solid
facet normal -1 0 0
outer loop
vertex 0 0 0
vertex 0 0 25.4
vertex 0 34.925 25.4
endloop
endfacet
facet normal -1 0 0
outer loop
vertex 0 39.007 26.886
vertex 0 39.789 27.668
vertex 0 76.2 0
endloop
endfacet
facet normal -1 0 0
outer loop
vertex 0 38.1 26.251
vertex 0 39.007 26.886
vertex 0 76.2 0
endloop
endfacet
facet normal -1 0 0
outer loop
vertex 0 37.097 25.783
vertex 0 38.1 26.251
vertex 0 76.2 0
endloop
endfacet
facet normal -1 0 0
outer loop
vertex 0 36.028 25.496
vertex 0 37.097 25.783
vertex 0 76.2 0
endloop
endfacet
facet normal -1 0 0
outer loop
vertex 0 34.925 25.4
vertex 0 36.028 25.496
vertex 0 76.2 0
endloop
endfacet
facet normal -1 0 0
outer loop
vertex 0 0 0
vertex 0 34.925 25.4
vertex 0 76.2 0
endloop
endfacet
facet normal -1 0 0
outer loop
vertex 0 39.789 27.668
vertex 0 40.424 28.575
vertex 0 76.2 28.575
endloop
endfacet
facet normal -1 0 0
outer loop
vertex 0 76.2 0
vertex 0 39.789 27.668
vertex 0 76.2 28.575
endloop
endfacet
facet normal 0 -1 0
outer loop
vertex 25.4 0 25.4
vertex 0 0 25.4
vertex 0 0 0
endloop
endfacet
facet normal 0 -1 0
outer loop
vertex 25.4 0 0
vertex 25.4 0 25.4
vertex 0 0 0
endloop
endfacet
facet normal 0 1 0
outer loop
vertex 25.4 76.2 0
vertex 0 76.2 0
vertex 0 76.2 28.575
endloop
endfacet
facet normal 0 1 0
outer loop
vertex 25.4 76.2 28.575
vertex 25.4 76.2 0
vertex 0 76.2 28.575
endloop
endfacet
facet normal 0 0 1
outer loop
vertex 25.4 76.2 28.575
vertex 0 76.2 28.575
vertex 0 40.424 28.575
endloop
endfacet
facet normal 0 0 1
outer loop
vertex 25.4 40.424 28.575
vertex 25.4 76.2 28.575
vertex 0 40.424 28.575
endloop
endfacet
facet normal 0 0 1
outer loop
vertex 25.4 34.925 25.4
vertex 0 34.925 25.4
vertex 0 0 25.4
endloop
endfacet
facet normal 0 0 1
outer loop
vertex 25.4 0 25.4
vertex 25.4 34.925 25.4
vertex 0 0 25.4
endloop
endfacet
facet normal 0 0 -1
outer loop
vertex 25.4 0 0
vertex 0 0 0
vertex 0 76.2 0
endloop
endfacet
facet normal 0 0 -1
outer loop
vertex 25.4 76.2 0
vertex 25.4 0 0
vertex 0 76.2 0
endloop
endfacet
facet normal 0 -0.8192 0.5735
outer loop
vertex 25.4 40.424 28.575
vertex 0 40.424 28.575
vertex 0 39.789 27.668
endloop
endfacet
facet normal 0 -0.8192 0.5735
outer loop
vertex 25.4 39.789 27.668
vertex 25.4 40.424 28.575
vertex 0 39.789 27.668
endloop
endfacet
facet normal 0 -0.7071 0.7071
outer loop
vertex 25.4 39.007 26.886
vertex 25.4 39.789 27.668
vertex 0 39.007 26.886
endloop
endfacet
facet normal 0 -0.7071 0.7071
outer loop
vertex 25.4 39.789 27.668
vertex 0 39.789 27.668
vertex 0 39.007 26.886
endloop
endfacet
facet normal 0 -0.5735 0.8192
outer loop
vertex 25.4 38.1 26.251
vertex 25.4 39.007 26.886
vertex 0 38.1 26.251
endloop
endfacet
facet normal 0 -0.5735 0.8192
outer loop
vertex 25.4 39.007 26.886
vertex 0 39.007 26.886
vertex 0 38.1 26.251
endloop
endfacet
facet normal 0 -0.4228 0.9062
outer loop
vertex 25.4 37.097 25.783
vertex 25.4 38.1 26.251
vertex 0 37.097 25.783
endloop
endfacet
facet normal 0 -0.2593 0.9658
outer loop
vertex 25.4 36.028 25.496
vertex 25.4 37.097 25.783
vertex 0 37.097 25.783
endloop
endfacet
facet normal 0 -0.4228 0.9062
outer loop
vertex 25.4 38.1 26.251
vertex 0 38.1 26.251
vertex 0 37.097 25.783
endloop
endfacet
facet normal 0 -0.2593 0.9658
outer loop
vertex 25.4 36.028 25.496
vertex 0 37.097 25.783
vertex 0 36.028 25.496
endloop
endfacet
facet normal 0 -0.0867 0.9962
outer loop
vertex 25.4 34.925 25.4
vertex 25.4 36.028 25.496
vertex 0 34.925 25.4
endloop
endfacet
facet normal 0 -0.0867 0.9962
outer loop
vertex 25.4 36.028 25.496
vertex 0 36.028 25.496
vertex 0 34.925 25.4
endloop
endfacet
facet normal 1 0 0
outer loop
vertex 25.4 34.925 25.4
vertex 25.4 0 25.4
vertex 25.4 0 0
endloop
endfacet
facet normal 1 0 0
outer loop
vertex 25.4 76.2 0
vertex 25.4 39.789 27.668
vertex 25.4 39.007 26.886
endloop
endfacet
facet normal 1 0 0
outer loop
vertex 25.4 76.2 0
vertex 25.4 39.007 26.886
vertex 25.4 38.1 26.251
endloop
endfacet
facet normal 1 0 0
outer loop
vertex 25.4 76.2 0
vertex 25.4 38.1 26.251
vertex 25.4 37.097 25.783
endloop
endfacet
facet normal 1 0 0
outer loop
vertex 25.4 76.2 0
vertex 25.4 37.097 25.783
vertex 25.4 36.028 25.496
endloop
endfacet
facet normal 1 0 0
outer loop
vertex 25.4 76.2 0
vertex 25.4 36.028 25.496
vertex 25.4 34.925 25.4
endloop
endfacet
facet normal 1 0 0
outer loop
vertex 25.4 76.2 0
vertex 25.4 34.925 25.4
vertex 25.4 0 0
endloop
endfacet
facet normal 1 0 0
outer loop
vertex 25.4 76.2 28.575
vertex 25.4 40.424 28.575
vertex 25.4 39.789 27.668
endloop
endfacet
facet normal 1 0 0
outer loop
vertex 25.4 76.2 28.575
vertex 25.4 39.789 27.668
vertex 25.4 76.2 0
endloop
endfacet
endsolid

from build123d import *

# Parameters (mm, degrees)
BOSS_EXTRUDE1_DEPTH = 25.4


with BuildPart() as part:
    # Sketch1 → Boss-Extrude1 (new body)
    with BuildSketch(Plane.YZ):
        with BuildLine():
            Line((0, 0), (76.2, 0))
            Line((76.2, 0), (76.2, 28.575))
            Line((76.2, 28.575), (40.424261314, 28.575))
            ThreePointArc((40.424261314, 28.575), (38.1, 26.250738686), (34.925, 25.4))
            Line((34.925, 25.4), (0, 25.4))
            Line((0, 25.4), (0, 0))
        make_face()
    extrude(amount=BOSS_EXTRUDE1_DEPTH)


solid = part.part
